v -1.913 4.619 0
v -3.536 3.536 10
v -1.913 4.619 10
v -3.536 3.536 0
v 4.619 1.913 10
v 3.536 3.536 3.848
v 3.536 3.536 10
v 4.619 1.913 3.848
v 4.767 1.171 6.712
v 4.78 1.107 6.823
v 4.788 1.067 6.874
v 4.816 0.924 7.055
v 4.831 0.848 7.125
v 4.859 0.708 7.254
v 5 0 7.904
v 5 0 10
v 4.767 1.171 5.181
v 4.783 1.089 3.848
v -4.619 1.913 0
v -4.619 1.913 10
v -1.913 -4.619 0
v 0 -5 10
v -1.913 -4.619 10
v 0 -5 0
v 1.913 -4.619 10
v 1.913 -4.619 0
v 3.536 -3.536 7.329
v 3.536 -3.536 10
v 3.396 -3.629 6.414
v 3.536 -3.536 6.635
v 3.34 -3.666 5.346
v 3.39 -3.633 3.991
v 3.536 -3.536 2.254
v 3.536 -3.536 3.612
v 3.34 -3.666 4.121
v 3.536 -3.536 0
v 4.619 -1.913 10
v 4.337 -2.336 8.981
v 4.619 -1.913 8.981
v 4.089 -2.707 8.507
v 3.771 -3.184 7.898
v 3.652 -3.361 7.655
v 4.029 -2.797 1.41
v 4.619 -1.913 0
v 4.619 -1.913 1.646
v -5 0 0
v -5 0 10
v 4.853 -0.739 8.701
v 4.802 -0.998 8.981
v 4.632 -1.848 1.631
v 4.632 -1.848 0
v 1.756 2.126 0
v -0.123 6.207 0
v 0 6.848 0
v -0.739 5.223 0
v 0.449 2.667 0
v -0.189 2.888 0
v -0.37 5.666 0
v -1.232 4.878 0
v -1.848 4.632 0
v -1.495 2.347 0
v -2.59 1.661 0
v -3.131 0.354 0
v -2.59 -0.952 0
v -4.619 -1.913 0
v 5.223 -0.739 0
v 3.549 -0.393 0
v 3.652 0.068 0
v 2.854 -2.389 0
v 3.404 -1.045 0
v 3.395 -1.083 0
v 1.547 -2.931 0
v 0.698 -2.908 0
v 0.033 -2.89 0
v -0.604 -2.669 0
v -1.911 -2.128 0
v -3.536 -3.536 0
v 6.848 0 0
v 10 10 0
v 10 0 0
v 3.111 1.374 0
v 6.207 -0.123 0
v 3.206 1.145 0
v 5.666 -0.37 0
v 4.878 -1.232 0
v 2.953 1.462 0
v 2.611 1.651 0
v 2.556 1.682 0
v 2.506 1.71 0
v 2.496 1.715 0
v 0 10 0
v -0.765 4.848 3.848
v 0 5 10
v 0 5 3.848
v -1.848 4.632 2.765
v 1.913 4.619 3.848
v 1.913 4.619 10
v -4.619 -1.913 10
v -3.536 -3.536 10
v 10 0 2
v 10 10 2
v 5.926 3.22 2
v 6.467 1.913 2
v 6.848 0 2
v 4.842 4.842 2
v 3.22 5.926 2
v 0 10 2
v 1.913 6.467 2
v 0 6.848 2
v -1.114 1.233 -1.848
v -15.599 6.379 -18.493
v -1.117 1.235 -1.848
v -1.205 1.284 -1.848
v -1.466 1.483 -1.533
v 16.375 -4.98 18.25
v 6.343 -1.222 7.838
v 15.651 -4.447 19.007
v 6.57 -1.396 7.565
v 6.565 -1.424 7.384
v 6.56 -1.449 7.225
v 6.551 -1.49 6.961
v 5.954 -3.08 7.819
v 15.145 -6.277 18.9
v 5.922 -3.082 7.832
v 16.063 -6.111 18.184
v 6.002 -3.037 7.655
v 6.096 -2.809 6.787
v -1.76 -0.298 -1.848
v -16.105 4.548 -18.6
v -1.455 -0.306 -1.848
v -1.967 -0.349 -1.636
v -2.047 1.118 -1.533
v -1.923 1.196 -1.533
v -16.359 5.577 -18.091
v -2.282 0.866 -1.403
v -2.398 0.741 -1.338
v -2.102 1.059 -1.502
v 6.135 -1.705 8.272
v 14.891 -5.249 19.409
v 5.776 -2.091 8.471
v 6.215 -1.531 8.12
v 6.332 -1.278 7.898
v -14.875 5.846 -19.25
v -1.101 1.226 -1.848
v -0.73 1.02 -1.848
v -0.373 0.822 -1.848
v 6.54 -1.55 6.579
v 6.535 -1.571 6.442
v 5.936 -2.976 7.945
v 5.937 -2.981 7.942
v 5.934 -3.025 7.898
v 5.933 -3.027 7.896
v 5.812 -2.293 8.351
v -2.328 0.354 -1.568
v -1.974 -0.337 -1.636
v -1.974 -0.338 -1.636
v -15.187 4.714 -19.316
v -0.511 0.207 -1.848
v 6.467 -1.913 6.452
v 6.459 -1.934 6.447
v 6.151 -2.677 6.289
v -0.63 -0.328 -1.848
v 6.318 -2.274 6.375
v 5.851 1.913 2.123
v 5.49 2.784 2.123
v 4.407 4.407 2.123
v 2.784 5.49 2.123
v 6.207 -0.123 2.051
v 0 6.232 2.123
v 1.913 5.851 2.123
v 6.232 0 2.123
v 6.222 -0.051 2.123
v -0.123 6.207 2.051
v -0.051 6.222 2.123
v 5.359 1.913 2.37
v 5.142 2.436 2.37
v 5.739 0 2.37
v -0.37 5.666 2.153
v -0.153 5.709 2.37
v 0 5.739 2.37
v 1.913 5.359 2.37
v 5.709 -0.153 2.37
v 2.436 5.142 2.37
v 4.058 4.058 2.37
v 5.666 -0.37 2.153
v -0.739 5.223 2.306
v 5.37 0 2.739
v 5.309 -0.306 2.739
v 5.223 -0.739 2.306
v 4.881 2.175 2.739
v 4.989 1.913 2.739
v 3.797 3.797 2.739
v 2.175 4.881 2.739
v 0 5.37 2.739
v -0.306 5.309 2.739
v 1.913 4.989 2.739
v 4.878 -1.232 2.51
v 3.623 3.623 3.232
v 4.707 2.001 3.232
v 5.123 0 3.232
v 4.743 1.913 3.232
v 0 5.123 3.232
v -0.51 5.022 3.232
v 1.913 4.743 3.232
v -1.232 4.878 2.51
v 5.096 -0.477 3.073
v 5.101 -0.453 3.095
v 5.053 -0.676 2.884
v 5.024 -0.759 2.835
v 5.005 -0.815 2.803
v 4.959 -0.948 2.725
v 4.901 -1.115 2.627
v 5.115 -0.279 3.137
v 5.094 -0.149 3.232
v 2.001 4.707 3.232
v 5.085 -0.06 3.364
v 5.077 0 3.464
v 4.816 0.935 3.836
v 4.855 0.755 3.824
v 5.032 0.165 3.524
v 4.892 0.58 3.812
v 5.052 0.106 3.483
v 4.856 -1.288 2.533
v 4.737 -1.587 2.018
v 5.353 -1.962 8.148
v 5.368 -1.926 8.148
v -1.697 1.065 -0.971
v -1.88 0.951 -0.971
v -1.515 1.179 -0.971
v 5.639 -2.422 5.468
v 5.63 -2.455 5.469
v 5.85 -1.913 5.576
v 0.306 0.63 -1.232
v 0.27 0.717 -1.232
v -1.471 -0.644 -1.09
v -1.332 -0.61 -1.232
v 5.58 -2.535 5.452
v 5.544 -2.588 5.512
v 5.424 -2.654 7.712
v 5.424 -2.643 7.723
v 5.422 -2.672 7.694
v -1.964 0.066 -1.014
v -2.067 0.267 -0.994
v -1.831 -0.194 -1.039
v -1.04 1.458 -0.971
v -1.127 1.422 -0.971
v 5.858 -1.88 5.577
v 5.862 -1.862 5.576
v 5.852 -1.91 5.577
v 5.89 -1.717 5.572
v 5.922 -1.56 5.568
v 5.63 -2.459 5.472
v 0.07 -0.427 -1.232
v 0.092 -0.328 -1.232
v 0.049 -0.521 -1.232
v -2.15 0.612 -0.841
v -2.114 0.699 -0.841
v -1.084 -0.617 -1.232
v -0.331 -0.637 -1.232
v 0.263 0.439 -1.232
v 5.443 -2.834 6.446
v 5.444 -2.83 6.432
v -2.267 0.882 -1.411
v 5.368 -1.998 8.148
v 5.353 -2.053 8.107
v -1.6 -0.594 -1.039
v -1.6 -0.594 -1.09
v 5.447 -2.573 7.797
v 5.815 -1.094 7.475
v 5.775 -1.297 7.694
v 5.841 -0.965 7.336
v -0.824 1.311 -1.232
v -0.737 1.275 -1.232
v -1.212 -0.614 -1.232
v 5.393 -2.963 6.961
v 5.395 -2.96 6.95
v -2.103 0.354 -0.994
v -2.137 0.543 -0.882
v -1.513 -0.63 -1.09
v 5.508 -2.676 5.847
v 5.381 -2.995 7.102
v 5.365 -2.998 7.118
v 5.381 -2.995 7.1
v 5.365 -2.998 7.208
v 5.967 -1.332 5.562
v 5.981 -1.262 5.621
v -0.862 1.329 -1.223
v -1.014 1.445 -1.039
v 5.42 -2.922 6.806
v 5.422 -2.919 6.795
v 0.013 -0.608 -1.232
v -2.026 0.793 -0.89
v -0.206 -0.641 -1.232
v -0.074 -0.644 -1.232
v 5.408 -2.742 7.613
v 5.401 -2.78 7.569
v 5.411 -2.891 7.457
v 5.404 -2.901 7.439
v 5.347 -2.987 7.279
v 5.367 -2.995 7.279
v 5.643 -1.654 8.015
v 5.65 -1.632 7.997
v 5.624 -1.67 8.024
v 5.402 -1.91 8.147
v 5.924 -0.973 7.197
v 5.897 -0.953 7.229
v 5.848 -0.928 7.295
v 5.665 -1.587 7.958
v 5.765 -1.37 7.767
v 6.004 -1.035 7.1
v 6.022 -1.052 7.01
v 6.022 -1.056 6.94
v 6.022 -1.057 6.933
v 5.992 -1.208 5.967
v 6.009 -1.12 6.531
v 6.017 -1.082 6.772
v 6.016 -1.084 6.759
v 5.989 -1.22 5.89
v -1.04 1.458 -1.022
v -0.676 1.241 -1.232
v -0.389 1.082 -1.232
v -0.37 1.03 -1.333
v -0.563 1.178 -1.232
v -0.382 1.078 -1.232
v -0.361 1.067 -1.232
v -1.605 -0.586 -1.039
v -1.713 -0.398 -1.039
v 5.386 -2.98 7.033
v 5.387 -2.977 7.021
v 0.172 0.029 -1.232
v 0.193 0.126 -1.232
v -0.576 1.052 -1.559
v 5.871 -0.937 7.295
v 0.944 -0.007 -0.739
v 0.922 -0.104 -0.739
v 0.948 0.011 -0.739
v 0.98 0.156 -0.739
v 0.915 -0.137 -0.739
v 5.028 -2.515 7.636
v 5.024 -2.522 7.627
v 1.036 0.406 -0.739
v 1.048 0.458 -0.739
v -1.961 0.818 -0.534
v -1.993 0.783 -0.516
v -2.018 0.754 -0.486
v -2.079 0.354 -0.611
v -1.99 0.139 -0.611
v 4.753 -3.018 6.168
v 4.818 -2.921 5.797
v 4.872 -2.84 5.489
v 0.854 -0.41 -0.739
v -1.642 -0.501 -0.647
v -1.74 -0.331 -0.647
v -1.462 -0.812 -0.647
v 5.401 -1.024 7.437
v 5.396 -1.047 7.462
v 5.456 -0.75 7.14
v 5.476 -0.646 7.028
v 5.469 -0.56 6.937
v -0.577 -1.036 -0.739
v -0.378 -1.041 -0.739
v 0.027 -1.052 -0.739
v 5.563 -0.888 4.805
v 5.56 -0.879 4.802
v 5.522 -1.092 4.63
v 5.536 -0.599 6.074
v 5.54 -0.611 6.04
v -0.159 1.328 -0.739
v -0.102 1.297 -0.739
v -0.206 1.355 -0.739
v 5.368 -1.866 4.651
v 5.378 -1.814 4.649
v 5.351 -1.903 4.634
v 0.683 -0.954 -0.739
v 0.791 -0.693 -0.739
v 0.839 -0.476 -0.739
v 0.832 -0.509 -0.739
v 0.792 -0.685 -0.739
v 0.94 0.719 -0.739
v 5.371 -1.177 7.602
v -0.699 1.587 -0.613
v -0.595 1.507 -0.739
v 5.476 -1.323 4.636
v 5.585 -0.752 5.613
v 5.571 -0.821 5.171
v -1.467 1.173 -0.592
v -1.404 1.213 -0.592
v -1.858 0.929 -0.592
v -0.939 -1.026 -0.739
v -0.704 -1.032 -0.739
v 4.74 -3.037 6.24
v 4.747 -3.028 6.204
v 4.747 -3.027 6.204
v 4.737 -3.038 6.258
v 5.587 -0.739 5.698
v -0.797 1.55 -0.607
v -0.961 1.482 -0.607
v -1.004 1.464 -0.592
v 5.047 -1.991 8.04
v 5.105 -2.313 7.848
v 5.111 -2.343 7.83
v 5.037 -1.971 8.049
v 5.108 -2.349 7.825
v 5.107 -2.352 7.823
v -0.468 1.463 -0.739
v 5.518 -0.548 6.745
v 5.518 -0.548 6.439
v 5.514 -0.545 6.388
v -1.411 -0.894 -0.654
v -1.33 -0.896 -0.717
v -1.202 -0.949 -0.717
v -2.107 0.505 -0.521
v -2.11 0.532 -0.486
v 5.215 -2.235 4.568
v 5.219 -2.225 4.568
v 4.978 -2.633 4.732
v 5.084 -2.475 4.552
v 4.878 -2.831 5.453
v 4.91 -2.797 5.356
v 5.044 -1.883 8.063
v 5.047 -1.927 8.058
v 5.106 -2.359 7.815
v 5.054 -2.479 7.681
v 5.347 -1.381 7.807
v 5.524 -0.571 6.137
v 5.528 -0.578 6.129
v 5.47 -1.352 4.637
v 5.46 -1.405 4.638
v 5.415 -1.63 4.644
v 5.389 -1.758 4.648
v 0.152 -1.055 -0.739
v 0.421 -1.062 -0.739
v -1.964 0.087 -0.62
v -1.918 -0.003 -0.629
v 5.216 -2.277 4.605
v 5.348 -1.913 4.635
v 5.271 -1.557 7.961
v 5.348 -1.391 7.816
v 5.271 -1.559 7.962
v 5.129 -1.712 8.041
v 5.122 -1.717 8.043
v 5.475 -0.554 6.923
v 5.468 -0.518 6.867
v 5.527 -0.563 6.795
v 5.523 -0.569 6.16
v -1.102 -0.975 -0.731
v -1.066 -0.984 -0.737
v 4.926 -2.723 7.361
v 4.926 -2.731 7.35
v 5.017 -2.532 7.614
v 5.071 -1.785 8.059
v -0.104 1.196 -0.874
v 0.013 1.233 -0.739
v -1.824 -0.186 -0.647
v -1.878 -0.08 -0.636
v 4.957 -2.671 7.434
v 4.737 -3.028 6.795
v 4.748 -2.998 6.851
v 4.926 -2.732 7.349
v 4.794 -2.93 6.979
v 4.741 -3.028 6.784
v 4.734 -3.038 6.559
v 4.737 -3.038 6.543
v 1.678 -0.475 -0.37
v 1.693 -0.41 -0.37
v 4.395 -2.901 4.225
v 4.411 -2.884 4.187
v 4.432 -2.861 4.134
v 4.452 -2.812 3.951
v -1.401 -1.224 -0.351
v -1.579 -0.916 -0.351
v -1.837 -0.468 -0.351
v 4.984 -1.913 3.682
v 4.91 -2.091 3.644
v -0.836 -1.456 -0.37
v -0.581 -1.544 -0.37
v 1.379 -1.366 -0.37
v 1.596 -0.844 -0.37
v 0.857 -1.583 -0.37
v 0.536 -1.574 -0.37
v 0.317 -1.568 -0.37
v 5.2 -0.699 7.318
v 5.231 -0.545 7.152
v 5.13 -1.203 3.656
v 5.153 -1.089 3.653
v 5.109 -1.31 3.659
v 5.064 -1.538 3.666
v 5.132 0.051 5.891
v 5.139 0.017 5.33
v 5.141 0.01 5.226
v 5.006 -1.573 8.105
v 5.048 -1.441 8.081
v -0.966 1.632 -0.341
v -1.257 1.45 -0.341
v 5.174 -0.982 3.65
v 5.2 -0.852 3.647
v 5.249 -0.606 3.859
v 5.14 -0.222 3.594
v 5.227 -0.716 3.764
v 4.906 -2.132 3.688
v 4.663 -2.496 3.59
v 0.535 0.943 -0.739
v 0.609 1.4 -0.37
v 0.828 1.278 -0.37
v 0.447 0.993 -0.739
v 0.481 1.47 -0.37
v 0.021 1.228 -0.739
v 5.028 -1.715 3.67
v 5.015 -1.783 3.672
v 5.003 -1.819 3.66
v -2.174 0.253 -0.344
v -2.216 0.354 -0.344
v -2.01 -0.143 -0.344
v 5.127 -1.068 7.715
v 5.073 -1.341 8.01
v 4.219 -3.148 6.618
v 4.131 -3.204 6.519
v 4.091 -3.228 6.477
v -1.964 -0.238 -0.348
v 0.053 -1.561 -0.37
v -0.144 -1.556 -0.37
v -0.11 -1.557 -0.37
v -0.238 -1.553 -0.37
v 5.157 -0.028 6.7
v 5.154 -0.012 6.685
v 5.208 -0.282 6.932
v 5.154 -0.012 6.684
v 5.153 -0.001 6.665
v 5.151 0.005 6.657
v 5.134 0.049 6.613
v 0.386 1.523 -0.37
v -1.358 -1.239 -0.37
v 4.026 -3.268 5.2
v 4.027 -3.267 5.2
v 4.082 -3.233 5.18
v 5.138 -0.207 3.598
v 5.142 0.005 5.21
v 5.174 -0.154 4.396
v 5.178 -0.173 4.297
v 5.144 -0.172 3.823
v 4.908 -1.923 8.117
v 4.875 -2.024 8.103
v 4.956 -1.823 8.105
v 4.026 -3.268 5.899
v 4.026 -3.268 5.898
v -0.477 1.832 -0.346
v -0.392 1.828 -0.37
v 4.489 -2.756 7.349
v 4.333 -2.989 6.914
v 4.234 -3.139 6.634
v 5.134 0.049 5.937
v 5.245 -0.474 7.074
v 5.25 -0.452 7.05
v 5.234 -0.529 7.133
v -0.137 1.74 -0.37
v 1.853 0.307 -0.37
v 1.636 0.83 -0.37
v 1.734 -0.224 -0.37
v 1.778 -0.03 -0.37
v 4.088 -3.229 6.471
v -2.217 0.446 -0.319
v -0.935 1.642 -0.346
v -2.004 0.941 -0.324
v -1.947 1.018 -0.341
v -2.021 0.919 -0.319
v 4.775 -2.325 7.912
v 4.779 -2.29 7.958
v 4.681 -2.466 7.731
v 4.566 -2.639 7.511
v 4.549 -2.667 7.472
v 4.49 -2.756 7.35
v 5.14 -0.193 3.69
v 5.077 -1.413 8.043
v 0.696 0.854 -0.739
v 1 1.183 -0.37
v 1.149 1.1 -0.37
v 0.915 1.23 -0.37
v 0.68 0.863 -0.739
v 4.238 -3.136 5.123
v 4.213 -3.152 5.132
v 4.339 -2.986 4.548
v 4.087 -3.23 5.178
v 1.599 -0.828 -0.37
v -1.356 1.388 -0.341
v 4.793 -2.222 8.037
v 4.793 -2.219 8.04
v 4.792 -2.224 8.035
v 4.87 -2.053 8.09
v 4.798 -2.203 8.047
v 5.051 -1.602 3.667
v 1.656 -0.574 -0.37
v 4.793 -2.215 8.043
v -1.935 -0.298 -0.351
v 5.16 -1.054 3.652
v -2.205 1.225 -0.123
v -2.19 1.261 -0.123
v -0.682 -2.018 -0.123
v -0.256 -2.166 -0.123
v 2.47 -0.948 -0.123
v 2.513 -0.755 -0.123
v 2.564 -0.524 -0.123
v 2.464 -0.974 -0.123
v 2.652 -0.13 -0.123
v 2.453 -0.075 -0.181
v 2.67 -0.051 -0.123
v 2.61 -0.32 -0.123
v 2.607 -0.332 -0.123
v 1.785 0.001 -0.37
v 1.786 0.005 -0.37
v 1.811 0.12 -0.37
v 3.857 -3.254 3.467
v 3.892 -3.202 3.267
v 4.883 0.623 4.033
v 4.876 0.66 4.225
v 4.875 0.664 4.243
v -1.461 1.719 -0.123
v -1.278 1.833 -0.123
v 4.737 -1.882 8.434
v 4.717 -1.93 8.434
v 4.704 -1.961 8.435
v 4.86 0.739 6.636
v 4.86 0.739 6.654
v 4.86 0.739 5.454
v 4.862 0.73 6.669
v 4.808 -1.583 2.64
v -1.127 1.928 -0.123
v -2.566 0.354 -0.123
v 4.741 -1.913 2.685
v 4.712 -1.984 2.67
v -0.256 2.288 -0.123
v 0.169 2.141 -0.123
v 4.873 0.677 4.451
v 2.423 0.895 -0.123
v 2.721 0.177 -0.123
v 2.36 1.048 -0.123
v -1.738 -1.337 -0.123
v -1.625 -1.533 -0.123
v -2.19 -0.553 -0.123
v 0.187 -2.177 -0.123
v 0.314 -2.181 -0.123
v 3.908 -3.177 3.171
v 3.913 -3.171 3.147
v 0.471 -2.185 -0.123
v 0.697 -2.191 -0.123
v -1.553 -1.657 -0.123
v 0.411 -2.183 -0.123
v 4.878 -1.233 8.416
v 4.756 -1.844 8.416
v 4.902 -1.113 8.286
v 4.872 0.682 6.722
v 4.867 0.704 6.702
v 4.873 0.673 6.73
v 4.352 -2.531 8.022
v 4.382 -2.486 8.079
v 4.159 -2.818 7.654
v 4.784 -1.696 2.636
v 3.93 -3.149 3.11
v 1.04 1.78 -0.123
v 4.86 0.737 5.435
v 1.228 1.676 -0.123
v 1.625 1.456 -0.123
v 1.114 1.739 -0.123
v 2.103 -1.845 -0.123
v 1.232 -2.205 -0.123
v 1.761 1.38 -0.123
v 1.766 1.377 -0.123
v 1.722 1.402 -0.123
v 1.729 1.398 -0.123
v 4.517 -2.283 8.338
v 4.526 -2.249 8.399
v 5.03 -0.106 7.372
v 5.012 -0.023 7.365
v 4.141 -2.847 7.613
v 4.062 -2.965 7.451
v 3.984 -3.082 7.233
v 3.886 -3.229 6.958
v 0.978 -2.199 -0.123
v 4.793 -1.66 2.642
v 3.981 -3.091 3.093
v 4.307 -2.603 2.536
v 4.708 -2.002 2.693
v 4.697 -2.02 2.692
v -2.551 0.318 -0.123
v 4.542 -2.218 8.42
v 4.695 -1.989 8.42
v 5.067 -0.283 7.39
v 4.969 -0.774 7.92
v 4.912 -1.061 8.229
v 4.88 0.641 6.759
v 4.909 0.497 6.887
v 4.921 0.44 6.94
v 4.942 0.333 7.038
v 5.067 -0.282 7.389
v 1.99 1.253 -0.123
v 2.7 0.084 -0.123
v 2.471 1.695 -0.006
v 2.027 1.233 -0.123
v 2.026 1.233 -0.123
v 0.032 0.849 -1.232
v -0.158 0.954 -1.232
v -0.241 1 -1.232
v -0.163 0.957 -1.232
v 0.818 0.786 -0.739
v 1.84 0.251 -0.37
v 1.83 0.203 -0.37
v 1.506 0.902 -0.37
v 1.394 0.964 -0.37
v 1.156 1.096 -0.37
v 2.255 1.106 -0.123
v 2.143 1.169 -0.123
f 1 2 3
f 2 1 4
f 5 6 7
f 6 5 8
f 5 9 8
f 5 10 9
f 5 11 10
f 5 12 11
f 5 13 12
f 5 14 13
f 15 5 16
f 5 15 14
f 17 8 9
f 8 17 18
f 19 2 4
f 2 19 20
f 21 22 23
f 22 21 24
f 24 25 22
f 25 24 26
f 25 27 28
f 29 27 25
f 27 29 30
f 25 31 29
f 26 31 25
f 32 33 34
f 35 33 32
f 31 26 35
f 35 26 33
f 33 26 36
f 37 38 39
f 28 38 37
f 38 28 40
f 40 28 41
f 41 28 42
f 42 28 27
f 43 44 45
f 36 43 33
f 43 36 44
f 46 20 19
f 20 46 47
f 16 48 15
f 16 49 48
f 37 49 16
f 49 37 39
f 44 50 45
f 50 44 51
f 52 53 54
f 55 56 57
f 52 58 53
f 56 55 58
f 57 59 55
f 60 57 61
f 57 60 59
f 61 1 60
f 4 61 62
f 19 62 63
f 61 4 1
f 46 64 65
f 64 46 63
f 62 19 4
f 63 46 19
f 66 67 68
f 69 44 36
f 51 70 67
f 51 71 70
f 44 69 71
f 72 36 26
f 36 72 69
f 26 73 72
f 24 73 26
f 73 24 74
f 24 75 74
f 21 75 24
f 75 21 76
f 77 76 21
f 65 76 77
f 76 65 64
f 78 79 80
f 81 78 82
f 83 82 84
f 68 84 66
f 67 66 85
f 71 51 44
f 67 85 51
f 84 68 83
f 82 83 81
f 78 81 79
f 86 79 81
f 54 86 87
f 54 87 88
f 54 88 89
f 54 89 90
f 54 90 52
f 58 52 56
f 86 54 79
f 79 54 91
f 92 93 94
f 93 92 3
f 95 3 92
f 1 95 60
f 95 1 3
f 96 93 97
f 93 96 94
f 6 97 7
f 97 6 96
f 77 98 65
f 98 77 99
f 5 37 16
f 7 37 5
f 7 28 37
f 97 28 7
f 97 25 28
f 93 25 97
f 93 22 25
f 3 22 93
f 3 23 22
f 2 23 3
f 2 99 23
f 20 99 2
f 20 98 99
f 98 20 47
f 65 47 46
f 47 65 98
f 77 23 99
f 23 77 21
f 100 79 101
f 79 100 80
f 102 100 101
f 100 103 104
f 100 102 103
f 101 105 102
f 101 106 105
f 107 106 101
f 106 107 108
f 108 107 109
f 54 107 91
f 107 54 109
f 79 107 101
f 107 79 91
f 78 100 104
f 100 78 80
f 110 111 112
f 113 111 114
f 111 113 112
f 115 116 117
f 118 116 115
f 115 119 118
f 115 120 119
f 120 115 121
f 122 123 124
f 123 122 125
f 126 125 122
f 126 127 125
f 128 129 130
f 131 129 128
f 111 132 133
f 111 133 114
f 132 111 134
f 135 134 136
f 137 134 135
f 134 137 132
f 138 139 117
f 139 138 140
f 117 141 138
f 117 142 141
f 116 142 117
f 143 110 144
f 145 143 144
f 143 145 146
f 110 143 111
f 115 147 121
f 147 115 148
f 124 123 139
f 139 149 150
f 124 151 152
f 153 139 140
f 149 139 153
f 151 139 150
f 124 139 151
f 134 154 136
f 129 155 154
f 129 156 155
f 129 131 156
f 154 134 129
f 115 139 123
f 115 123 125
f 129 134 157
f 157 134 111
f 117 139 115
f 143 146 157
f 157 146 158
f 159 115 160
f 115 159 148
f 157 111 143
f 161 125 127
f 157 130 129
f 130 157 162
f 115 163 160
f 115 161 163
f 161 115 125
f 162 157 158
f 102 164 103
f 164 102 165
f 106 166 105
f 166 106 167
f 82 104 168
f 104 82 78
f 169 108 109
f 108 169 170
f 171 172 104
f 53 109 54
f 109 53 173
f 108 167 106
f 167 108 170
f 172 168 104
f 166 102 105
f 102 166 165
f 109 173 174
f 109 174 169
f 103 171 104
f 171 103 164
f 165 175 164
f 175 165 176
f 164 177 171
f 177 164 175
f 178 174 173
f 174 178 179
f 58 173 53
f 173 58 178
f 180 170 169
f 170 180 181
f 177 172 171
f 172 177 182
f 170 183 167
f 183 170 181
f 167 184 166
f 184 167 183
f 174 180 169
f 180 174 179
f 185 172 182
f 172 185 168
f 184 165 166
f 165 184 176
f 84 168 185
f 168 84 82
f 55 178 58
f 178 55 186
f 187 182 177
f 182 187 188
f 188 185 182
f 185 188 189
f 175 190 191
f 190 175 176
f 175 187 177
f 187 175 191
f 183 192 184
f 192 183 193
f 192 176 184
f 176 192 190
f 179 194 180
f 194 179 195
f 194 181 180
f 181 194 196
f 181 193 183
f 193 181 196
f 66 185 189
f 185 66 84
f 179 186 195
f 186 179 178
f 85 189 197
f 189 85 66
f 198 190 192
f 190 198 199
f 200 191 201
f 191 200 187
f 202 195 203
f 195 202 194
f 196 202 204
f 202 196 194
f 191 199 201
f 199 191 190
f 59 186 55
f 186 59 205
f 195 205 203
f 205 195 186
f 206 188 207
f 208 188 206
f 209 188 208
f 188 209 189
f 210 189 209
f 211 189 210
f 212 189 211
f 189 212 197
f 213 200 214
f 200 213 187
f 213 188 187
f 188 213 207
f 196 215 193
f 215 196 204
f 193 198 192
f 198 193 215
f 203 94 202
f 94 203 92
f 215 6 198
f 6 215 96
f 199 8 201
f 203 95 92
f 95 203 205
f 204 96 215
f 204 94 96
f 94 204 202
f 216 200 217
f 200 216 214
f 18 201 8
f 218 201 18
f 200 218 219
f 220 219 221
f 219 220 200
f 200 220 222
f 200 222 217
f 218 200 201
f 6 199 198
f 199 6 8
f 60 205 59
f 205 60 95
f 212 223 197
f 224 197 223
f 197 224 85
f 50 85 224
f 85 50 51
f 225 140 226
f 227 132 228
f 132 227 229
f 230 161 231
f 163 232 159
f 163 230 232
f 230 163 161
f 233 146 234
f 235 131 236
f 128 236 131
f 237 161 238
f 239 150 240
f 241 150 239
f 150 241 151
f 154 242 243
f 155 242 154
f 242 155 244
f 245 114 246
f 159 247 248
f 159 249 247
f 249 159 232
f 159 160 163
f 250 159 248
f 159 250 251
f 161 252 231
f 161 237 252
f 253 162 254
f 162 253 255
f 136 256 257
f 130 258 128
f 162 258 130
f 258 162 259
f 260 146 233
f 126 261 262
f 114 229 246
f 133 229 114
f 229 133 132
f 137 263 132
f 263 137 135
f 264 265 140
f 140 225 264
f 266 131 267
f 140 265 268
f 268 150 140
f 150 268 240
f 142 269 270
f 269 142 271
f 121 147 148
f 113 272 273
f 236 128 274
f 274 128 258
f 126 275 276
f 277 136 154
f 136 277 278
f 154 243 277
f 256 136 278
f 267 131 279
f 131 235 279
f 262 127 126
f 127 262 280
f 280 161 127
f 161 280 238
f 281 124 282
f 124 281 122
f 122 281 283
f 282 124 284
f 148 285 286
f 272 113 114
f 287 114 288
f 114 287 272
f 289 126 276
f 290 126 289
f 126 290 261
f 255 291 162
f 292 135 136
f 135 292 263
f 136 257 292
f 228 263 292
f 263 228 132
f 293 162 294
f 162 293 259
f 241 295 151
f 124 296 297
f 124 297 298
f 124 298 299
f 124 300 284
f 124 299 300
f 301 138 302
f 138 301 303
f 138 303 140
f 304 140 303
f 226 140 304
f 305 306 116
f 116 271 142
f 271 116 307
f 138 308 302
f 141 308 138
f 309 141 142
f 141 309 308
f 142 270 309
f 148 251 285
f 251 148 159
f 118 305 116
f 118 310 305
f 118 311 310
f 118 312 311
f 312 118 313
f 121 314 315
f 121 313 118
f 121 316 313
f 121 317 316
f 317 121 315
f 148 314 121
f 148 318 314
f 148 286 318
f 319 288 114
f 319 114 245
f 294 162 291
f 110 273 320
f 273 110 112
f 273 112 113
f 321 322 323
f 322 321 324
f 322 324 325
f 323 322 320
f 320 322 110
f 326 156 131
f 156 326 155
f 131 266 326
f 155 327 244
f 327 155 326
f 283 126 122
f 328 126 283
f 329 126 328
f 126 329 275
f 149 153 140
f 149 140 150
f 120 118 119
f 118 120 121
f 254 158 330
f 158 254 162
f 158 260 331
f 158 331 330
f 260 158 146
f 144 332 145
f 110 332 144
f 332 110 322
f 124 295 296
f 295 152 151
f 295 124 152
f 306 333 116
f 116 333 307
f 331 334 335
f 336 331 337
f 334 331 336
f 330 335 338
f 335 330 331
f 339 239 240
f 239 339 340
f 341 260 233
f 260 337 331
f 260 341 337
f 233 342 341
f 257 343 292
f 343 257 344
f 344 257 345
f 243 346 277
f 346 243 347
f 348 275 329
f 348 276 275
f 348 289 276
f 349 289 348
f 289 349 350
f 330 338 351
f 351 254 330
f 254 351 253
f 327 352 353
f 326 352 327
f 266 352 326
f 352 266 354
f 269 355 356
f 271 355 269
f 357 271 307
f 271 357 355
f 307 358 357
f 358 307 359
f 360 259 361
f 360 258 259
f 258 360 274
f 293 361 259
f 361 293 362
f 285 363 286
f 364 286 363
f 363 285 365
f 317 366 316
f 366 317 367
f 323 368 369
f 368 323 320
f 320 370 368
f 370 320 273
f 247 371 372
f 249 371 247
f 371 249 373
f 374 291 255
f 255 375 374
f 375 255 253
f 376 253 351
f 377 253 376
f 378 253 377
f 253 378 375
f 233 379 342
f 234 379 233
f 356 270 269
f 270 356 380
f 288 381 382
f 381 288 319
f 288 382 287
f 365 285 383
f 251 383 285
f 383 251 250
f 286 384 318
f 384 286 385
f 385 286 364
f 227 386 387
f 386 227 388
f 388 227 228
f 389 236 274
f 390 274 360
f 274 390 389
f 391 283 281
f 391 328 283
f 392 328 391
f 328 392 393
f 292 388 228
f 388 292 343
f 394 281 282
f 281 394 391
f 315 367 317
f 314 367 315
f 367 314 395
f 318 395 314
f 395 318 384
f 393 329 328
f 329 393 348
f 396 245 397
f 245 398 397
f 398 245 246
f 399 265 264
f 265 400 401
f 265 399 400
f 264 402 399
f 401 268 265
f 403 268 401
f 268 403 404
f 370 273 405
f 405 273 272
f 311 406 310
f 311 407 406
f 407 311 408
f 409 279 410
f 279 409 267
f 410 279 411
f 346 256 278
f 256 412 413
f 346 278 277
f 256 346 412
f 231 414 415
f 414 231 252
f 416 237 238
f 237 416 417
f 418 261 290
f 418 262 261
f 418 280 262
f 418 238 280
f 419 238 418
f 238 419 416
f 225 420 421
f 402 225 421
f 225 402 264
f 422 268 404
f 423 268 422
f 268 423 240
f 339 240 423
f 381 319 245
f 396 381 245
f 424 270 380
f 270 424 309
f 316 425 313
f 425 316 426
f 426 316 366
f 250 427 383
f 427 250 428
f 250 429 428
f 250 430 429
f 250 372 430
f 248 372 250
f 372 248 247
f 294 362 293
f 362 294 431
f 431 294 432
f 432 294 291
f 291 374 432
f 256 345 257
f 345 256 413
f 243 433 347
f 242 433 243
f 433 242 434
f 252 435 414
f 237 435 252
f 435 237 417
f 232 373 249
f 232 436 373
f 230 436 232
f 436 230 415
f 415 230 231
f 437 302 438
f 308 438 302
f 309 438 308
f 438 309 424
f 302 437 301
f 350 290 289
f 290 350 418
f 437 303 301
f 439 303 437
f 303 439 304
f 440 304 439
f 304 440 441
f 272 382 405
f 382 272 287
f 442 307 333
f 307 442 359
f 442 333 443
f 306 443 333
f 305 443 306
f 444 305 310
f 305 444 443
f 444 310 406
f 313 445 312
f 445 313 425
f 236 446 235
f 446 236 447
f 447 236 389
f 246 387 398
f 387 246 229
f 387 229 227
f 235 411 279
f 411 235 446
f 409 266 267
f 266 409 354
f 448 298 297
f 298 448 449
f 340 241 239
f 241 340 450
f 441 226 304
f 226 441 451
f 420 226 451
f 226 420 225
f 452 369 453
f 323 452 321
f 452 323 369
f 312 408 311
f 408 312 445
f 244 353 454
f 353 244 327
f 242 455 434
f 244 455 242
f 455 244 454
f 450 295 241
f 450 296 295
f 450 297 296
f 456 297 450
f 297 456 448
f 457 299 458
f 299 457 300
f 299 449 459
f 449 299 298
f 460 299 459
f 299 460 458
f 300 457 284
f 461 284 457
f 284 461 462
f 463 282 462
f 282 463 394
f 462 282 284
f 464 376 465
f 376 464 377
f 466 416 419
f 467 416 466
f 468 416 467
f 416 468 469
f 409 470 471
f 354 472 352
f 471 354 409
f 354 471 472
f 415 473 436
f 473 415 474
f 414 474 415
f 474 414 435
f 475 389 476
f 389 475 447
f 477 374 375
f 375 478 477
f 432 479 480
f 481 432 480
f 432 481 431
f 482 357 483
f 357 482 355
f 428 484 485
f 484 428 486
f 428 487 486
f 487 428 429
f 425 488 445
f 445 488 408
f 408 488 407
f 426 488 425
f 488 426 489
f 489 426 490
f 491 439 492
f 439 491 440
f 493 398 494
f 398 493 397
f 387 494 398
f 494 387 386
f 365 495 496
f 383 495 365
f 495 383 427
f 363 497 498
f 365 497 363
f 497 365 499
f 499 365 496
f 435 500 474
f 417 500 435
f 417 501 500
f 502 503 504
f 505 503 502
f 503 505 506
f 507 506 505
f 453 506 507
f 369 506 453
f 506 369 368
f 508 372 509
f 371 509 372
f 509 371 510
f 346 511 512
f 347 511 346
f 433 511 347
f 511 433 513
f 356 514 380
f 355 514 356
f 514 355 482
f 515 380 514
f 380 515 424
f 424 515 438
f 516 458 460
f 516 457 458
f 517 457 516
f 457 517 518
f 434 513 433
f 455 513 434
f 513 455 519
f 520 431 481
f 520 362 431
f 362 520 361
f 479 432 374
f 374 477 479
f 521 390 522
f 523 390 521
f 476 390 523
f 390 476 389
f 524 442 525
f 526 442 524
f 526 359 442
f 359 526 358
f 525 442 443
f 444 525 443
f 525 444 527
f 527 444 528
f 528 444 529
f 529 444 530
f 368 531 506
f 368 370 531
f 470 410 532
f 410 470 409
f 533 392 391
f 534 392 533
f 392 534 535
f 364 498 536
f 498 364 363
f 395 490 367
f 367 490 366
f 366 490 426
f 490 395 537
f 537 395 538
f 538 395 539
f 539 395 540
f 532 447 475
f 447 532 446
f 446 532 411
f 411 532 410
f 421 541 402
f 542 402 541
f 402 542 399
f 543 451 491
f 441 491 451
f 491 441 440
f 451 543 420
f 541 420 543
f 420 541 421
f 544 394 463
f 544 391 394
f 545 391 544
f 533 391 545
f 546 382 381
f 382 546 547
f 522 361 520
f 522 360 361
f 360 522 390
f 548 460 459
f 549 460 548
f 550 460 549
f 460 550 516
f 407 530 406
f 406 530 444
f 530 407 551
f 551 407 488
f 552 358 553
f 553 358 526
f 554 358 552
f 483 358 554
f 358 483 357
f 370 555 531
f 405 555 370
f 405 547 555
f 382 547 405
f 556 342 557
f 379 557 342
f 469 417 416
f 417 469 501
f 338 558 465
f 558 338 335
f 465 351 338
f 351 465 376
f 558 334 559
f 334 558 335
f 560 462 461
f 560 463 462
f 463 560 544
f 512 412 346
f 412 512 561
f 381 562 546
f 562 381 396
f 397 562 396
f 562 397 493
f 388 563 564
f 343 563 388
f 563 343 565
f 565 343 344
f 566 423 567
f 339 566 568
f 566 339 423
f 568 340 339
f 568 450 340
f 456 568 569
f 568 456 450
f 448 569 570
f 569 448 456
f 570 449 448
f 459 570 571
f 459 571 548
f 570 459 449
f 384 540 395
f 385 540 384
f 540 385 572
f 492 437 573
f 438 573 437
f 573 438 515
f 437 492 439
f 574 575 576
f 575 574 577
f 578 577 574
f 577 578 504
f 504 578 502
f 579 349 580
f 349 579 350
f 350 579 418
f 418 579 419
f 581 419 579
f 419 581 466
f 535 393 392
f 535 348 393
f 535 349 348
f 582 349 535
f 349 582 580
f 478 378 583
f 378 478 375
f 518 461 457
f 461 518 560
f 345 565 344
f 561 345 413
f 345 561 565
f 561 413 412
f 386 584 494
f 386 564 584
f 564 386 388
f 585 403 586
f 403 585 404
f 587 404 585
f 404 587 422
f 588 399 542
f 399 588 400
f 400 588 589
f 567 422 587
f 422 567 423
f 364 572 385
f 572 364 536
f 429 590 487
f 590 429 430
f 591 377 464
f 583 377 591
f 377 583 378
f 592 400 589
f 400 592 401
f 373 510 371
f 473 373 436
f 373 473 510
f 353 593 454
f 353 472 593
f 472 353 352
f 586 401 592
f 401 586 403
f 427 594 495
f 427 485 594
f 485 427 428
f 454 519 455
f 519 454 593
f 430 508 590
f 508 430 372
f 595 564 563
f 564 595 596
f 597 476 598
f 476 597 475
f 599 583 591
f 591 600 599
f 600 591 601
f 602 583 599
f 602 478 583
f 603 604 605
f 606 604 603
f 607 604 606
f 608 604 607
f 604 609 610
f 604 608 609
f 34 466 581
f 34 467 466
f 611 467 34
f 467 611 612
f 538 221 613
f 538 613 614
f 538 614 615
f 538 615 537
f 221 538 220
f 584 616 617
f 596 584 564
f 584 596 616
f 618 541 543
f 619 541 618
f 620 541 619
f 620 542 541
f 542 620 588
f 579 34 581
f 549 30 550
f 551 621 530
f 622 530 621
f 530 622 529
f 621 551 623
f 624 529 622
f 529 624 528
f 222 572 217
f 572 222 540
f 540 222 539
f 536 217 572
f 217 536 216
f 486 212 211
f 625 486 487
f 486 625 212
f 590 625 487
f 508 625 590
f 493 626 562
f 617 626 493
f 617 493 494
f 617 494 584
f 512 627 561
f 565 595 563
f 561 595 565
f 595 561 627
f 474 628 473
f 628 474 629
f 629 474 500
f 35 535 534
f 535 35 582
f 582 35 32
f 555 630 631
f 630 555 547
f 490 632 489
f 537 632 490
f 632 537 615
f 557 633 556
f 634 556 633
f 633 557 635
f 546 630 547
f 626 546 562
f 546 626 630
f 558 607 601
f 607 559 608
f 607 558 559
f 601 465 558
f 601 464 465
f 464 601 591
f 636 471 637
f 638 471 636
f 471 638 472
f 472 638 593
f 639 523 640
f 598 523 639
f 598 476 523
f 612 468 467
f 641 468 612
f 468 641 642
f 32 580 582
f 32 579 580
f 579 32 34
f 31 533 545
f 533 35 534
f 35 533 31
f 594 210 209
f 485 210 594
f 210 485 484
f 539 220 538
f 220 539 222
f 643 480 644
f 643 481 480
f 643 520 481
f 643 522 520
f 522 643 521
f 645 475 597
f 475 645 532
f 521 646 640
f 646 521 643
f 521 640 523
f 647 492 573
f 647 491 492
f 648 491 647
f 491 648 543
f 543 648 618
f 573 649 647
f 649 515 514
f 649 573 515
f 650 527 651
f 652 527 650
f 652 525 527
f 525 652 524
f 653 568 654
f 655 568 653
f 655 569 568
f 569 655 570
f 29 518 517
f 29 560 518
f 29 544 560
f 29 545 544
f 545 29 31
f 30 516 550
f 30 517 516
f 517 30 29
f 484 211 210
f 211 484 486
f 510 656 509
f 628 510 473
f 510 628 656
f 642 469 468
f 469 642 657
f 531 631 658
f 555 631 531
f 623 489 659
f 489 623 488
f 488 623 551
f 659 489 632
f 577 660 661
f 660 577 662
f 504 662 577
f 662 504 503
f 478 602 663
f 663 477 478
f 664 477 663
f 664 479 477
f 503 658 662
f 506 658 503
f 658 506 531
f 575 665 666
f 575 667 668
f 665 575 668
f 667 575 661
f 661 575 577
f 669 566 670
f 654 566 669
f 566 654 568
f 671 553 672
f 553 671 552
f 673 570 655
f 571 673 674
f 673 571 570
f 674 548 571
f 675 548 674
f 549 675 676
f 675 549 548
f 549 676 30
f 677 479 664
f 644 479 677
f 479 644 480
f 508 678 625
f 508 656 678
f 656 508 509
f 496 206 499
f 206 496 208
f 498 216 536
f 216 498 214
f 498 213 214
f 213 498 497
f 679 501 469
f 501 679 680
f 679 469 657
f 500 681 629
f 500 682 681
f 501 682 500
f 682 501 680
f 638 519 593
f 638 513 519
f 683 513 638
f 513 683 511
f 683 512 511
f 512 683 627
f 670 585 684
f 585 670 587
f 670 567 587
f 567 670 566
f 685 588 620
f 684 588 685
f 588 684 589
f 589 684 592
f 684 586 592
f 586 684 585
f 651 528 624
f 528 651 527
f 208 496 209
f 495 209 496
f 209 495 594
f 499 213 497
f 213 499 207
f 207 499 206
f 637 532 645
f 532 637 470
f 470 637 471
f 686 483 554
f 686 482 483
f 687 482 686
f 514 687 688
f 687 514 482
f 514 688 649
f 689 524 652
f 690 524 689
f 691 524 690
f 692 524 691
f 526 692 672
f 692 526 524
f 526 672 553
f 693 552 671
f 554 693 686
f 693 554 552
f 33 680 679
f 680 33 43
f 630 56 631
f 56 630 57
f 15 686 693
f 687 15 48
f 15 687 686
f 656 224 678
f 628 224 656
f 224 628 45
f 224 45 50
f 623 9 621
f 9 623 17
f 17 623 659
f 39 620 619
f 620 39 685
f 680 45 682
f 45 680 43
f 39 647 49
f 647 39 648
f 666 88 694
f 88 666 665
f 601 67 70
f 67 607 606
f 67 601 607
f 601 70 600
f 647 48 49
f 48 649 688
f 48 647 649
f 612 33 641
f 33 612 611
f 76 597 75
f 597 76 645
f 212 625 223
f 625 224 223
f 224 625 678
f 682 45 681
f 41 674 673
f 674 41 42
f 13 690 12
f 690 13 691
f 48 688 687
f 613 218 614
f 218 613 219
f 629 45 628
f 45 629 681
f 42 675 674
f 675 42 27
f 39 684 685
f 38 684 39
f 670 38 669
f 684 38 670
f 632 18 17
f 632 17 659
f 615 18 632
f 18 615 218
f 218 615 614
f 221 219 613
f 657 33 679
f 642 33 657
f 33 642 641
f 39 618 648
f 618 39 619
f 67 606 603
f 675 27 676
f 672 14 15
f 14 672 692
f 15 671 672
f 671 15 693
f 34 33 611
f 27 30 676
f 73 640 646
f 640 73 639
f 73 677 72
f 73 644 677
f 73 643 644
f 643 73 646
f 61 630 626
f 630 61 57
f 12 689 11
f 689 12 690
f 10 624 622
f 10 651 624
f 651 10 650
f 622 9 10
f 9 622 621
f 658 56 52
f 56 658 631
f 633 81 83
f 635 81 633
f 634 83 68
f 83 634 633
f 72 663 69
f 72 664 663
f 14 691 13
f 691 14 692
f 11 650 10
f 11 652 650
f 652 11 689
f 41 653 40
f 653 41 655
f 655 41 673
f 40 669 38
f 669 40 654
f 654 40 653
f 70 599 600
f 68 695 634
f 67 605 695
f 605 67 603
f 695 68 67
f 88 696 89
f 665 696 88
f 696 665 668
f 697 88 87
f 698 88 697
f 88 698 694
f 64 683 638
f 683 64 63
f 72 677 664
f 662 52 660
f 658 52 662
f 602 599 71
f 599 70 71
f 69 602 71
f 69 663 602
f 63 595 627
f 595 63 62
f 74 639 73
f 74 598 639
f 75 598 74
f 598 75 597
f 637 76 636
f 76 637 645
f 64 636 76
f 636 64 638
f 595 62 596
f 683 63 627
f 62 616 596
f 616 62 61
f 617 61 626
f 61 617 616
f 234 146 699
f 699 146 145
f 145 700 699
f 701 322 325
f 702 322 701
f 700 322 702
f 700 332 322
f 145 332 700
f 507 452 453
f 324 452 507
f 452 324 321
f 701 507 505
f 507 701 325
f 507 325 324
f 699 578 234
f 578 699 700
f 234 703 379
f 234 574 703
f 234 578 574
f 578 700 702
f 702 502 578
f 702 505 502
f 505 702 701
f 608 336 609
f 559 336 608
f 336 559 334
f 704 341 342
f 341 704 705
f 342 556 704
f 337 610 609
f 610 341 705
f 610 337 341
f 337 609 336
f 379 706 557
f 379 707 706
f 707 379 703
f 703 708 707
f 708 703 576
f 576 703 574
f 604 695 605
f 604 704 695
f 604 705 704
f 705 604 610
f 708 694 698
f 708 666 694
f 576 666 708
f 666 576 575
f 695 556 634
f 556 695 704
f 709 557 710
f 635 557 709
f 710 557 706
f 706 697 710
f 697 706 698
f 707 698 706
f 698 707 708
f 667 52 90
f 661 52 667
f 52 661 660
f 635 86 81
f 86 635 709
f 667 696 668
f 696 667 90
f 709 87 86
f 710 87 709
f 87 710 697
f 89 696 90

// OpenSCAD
//Taken from https://github.com/clothbot/ClothBotCreations/blob/master/utilities/fillet.scad

module fillet(r=1.0,steps=3,include=true) {
  if(include) for (k=[0:$children-1]) {
	children(k);
  }
  for (i=[0:$children-2] ) {
    for(j=[i+1:$children-1] ) {
	fillet_two(r=r,steps=steps) {
	  children(i);
	  children(j);
	  intersection() {
		children(i);
		children(j);
	  }
	}
    }
  }
}

module fillet_two(r=1.0,steps=3) {
  for(step=[1:steps]) {
	hull() {
	  render() intersection() {
		children(0);
		offset_3d(r=r*step/steps) children(2);
	  }
	  render() intersection() {
		children(1);
		offset_3d(r=r*(steps-step+1)/steps) children(2);
	  }
	}
  }
}

module offset_3d(r=1.0) {
  for(k=[0:$children-1]) minkowski() {
	children(k);
	sphere(r=r,$fn=8);
  }
}

// example:
fillet(r=2,steps=5) {
	cylinder(r=5,h=10);
	cube([10,10,2]);
	rotate([30,30,30]) cylinder(r=1.0,h=50,center=true);
}
